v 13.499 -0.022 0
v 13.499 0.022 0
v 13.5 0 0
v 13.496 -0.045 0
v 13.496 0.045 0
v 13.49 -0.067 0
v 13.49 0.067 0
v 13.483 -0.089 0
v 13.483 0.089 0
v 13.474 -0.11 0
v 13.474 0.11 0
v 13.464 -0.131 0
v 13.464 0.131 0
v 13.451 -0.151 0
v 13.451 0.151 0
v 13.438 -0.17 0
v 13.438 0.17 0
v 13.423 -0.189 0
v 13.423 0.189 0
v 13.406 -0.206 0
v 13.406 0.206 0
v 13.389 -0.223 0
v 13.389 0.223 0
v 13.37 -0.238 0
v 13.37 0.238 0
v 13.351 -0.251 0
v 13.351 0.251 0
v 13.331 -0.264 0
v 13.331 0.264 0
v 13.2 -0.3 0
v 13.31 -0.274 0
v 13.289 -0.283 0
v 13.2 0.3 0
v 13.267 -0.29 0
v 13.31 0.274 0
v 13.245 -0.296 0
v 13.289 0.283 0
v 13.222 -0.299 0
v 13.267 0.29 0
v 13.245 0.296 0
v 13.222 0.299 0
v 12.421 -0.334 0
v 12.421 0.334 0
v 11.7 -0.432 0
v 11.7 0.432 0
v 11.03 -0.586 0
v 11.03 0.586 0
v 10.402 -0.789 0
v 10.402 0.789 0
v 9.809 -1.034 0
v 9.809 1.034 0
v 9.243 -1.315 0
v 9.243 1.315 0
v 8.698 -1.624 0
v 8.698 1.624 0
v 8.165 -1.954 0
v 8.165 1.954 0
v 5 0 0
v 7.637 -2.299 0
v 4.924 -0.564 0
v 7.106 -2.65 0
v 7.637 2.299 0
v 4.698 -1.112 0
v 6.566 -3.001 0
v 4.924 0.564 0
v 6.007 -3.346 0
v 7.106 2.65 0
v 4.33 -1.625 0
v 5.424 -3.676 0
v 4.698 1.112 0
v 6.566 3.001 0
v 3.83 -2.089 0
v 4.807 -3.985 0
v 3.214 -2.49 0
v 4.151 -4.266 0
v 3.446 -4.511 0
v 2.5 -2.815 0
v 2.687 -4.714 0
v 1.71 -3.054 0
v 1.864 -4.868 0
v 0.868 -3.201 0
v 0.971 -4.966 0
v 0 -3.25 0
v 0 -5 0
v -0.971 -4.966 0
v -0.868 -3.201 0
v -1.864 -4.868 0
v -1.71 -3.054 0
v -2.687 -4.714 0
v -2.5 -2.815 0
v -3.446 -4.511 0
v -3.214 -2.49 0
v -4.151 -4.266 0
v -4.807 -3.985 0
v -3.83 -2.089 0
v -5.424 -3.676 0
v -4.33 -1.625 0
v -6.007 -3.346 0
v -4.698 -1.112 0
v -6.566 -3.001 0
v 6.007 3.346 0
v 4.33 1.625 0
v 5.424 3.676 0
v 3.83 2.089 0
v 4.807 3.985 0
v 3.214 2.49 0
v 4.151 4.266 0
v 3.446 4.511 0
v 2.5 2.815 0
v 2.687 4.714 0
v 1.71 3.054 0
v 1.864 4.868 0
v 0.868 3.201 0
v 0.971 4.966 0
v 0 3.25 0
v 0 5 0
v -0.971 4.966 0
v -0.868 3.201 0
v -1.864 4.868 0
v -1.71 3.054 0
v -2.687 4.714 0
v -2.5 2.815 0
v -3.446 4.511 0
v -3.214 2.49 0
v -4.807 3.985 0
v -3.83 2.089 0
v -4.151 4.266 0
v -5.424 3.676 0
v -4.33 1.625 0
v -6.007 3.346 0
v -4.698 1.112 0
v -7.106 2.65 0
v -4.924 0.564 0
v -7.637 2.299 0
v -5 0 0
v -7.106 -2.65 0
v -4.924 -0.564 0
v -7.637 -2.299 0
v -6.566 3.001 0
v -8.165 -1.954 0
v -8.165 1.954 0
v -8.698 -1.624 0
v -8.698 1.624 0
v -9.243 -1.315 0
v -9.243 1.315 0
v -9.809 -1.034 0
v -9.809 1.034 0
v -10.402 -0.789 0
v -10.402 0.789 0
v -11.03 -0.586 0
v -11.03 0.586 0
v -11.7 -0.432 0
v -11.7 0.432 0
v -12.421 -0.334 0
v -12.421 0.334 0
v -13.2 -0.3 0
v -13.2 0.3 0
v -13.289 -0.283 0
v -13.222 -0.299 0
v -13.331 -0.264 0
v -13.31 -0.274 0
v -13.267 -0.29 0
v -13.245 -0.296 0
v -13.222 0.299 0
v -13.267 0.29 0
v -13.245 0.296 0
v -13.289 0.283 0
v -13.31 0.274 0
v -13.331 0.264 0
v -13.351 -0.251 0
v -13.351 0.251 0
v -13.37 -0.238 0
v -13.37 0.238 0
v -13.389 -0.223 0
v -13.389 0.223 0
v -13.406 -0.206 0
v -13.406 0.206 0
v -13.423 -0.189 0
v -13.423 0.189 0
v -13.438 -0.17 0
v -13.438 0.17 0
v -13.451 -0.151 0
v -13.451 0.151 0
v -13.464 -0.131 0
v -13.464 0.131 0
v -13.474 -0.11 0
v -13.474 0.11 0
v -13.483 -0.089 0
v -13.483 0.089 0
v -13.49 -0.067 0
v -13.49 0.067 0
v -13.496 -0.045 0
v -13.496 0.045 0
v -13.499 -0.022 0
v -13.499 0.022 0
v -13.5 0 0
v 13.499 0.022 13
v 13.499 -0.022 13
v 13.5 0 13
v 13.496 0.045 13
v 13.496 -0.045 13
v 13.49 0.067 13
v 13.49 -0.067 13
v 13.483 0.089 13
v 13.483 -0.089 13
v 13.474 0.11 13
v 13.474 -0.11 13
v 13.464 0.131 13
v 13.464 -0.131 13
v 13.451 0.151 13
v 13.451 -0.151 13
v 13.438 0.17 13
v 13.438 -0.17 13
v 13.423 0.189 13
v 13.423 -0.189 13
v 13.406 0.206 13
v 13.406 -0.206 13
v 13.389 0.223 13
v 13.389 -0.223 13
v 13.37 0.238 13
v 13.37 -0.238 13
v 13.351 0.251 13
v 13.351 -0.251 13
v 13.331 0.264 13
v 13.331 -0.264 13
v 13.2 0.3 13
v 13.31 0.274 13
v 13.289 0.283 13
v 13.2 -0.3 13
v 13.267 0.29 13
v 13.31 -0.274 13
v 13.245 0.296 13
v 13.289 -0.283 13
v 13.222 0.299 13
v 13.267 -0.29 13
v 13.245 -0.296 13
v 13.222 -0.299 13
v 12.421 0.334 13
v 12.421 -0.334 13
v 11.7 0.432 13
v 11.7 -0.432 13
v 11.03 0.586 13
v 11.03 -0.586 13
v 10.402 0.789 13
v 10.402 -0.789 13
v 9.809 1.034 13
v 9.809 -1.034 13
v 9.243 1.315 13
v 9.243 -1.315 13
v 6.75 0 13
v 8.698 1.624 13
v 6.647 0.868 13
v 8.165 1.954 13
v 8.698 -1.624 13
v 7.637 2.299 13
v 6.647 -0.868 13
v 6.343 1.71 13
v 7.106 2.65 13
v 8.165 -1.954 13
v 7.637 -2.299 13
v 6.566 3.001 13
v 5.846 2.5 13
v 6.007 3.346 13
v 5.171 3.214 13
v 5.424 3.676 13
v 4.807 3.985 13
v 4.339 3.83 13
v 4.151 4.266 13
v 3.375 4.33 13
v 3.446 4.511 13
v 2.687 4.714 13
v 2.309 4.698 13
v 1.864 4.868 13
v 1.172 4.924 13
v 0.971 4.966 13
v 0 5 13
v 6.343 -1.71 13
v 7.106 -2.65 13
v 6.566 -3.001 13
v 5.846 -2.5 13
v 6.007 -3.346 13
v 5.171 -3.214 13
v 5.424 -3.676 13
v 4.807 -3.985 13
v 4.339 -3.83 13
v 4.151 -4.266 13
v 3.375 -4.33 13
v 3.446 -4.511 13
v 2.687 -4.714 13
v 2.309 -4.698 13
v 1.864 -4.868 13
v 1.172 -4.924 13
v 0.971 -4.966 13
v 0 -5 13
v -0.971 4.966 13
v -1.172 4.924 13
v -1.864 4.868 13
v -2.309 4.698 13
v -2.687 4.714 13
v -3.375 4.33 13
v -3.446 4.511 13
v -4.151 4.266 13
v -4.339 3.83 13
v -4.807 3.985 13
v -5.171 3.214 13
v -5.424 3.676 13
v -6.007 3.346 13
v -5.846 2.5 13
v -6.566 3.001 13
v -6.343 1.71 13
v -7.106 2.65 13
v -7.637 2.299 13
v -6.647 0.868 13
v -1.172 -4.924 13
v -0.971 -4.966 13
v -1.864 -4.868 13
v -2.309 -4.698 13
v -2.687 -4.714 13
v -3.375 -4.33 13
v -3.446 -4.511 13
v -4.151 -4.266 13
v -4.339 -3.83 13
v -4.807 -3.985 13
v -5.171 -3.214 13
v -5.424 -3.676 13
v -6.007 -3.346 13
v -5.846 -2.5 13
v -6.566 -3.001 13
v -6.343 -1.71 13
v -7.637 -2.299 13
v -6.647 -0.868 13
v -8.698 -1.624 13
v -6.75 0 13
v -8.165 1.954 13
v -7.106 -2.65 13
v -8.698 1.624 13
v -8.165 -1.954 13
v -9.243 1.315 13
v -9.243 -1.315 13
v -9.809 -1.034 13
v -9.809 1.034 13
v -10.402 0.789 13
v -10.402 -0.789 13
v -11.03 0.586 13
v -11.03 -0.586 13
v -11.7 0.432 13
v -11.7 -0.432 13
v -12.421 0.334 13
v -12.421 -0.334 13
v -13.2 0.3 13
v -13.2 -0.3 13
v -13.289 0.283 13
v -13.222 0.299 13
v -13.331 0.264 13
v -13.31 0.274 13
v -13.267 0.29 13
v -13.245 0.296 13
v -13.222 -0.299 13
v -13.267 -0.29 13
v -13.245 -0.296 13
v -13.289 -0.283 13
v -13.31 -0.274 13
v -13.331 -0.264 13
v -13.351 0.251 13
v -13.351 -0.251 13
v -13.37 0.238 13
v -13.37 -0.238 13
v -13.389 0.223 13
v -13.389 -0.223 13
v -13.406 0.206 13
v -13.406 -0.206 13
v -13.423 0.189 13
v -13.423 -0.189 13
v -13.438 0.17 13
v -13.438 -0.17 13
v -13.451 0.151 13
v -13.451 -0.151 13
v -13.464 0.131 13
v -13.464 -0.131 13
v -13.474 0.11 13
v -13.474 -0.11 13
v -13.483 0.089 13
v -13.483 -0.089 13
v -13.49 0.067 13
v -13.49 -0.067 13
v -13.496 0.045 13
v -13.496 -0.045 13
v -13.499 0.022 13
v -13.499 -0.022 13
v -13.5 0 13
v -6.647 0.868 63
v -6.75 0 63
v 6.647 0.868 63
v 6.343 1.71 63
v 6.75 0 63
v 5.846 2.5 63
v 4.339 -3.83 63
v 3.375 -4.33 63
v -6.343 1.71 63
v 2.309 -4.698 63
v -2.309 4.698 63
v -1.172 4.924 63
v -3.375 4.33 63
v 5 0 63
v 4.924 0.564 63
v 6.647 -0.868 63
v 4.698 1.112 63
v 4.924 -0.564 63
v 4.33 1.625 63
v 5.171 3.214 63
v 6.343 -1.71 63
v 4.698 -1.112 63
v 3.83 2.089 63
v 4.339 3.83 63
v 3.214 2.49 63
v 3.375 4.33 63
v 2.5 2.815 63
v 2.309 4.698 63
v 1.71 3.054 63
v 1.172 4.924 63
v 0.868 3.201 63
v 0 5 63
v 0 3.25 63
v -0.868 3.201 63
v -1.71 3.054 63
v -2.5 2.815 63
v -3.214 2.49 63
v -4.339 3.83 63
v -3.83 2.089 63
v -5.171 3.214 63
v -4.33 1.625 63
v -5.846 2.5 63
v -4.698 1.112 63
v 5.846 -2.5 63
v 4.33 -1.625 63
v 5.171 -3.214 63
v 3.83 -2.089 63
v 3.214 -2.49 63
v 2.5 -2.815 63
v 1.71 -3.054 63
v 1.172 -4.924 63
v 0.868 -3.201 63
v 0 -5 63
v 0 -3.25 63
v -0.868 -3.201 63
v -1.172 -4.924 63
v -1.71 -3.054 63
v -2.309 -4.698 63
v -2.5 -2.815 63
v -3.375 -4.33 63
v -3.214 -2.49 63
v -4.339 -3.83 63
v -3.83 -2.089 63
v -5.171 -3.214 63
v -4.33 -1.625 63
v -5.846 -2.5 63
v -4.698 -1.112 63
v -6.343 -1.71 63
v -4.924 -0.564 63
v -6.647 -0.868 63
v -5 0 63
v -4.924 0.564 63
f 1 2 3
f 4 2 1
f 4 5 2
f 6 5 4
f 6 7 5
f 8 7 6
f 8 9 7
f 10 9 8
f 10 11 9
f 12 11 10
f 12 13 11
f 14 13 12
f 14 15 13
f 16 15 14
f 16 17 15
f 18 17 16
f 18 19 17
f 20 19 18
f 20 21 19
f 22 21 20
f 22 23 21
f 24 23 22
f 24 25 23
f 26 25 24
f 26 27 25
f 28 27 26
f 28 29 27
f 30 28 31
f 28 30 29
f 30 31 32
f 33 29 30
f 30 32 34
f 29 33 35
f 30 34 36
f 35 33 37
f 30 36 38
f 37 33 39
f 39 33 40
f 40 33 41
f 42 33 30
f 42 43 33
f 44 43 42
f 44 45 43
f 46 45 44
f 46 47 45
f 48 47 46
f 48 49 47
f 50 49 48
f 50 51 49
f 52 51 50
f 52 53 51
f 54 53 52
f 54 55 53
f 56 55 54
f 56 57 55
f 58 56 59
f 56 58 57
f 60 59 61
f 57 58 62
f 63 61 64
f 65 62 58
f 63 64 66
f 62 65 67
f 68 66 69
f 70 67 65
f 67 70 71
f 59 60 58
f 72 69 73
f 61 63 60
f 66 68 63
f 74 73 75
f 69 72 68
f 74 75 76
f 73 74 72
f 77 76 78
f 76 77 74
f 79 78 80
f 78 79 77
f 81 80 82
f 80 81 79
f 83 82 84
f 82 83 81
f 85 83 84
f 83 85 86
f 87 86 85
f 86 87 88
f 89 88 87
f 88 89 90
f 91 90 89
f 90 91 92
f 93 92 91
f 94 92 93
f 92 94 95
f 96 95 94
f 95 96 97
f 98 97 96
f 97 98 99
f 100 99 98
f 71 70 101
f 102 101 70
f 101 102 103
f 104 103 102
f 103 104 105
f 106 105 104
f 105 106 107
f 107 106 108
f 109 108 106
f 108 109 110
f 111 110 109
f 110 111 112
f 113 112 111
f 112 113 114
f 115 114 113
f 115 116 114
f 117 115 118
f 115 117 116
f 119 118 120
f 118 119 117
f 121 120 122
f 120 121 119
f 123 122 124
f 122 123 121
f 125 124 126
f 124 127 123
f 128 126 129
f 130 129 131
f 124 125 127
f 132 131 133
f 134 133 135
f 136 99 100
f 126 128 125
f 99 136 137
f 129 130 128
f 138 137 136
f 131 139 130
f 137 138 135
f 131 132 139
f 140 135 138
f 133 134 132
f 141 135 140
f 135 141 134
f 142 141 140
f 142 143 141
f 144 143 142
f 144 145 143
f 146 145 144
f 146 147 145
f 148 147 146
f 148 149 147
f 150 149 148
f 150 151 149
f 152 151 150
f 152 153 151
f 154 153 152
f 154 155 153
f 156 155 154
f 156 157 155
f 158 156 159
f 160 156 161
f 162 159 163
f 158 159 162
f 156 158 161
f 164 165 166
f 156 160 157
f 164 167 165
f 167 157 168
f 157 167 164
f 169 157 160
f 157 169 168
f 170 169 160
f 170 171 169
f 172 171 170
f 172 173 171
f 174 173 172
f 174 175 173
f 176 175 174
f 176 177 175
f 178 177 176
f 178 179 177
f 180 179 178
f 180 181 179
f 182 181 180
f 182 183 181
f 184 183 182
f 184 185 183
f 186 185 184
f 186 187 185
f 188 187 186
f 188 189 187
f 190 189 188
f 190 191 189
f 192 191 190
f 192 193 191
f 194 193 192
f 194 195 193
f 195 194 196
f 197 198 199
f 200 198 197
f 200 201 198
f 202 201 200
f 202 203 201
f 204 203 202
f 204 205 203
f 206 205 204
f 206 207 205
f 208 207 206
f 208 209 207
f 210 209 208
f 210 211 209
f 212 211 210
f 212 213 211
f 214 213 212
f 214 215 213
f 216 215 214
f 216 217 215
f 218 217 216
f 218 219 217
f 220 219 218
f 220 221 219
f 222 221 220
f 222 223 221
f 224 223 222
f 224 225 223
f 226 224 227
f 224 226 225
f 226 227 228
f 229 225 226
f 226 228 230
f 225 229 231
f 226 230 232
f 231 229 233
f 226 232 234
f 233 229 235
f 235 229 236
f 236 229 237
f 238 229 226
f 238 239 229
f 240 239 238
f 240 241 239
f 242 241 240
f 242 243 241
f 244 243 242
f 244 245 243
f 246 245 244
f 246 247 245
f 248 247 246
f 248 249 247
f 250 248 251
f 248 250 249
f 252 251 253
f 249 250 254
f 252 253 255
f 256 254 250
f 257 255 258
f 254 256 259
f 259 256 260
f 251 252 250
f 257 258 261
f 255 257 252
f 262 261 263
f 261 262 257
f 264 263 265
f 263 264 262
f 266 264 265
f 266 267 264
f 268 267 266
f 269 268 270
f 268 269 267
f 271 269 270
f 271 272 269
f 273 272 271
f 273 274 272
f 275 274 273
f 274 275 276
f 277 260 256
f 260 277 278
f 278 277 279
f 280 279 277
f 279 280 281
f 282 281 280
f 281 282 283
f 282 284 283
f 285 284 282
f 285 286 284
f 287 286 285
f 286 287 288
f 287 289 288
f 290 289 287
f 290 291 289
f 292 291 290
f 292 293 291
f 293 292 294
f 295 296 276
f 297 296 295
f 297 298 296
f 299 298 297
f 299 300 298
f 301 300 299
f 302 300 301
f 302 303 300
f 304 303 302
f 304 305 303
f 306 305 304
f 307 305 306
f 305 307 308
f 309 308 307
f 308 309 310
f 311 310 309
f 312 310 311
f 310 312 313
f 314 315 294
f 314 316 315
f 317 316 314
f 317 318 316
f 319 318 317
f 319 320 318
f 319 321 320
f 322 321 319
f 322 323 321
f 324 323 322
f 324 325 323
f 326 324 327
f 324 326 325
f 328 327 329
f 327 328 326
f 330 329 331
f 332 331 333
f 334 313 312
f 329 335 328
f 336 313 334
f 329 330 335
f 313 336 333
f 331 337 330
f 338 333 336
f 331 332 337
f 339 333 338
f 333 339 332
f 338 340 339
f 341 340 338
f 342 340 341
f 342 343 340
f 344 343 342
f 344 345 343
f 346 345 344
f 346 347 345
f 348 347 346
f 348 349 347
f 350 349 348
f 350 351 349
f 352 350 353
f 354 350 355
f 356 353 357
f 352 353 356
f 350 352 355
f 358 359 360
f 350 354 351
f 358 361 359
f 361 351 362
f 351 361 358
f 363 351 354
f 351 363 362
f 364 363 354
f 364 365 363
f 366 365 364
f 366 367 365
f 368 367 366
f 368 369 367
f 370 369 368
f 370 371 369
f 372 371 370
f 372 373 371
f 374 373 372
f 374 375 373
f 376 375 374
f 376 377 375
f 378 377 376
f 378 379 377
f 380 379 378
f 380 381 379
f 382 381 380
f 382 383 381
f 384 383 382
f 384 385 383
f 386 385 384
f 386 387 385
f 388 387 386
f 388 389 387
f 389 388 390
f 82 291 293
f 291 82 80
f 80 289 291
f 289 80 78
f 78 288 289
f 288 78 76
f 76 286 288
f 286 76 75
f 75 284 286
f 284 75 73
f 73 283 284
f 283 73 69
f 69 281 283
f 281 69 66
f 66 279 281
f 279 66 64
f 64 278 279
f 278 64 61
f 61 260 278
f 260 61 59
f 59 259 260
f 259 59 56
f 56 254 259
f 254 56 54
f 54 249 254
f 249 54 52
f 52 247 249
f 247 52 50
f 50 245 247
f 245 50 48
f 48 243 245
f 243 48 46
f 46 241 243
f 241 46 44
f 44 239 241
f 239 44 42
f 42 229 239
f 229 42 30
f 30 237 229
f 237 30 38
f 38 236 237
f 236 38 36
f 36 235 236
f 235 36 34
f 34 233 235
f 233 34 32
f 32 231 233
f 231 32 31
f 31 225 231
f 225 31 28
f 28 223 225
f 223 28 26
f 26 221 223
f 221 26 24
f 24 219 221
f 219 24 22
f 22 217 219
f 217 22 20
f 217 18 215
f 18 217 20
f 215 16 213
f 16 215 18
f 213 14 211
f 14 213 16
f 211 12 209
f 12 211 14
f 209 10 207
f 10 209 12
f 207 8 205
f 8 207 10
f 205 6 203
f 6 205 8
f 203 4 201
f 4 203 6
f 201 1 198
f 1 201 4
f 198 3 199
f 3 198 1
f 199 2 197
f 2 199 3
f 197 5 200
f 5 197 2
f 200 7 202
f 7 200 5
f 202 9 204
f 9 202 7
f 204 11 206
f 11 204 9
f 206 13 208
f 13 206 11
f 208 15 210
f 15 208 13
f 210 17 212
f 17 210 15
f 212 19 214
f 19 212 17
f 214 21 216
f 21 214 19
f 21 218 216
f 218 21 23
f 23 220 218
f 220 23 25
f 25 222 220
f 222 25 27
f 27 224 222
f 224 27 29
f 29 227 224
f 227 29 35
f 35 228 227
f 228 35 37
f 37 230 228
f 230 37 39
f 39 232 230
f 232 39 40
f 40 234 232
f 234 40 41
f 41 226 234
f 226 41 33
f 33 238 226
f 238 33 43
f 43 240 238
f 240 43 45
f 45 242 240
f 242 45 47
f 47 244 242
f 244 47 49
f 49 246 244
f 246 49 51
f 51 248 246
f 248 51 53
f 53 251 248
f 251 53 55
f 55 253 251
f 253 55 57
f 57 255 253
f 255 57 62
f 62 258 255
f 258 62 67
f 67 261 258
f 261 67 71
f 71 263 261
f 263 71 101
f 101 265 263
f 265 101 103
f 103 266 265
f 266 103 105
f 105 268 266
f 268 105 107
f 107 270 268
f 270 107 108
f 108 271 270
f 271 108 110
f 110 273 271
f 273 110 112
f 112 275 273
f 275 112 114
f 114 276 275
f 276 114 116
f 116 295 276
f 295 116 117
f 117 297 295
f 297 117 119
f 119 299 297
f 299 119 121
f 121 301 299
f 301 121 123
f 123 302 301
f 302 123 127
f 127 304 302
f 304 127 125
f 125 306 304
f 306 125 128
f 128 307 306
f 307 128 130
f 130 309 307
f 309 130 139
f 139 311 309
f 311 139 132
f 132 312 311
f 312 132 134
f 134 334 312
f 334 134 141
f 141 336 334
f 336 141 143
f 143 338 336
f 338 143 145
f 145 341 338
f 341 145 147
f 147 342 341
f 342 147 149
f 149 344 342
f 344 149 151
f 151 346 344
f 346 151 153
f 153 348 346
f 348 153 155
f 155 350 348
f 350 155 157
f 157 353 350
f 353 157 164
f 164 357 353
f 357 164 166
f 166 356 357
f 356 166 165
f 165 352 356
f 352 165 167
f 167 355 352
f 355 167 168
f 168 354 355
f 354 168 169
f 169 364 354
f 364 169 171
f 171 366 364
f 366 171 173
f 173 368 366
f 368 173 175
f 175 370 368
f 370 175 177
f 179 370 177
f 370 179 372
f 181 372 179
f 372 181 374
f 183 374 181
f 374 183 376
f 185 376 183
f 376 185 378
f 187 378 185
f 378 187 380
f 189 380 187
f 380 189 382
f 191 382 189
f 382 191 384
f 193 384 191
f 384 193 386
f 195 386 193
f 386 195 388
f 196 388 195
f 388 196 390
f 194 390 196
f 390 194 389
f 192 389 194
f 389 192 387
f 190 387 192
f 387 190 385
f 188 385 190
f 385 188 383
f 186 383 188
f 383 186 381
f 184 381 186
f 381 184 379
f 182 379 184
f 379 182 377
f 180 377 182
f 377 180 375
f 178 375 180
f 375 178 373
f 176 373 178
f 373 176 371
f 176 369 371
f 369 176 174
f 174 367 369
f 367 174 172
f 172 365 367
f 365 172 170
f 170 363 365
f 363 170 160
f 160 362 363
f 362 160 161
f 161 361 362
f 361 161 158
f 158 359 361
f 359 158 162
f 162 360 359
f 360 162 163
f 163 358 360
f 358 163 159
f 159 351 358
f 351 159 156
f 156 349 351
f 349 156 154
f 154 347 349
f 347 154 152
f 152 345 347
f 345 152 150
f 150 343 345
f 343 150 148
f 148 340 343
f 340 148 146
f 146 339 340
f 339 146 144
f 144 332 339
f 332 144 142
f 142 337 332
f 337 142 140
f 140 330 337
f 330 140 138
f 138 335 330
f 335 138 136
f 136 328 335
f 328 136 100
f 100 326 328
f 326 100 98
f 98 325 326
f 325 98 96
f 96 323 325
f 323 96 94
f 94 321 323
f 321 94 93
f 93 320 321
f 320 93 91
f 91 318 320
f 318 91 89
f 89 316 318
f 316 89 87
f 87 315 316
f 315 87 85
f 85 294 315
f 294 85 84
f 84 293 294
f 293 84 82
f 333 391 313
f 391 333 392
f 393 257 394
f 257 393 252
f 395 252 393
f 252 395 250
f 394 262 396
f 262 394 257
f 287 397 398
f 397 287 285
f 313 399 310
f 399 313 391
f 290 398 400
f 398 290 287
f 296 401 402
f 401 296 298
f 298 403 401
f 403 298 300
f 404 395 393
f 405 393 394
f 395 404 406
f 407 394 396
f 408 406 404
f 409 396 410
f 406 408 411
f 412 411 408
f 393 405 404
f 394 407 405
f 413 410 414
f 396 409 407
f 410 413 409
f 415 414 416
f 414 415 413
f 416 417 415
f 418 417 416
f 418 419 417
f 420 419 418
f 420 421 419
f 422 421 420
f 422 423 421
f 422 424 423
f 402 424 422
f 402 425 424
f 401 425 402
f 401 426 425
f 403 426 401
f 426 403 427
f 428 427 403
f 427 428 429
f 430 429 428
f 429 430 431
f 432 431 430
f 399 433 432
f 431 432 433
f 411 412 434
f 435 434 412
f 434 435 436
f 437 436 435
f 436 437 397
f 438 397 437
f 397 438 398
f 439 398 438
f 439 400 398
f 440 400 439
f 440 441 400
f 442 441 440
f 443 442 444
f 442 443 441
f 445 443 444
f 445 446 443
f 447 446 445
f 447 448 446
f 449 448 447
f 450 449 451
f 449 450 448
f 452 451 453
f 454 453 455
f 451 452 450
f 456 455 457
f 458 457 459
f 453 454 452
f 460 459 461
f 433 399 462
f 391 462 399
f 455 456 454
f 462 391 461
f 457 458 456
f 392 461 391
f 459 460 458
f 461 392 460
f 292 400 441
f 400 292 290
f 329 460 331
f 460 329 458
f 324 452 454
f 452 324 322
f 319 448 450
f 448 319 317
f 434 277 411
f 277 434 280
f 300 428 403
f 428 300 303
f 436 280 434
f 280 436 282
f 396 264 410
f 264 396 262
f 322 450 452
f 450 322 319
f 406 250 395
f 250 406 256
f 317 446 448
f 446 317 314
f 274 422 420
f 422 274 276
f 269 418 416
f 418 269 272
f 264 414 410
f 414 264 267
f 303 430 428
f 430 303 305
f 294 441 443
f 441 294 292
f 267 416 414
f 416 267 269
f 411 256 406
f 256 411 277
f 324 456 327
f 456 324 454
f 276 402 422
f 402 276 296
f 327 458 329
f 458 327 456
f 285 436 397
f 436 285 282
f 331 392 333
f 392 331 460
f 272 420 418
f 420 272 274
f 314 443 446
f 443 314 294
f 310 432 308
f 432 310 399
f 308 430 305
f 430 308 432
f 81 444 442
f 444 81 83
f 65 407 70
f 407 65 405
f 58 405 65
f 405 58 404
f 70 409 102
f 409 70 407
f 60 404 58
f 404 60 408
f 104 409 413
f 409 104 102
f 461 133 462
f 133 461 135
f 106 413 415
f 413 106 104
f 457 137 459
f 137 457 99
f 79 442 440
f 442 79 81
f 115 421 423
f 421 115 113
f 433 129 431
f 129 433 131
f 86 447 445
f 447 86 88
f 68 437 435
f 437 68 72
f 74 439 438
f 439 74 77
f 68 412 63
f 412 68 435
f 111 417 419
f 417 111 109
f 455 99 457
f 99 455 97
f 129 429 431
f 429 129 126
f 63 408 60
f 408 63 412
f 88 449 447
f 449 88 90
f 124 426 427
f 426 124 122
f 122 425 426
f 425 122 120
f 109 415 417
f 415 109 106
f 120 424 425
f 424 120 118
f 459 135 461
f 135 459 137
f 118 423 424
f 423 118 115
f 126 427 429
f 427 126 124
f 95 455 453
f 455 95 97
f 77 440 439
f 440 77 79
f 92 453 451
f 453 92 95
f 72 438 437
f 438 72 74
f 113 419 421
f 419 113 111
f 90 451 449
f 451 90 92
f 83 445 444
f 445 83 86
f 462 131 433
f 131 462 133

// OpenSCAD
use <bezier.scad>;

//<params>
tubeID = 10;
tubeWall = 1.75;
tubeHeight = 50;
baseHeight = 13;
baseWidth = 27;
holeAspectRatio = 0.65;
minimumWidth = 0.6;
tensionFactor1 = 0.2;
tensionFactor2 = 0.25;
//</params>

module dummy() {}
$fn = 36;

tubeH = tubeID * holeAspectRatio + tubeWall*2;
tubeW = tubeID + tubeWall*2;

module base() {
    polygon(Bezier([[-baseWidth/2,0],
    POLAR(minimumWidth/4,90),POLAR(minimumWidth/4,180),[-baseWidth/2+minimumWidth/2,minimumWidth/2],
    POLAR(baseWidth*tensionFactor1,0),POLAR(baseWidth*tensionFactor2,180),[0,tubeH/2],REPEAT_MIRRORED([1,0]),REPEAT_MIRRORED([0,-1])]));
}

difference() {
    union() {
        linear_extrude(height=baseHeight)
        base();
        scale([1,tubeH/tubeW,1])
        cylinder(d=tubeW,h=tubeHeight+baseHeight);
    }
    scale([1,holeAspectRatio,1])
    cylinder(d=tubeID,h=4*(tubeHeight+baseHeight),center=true);
}
